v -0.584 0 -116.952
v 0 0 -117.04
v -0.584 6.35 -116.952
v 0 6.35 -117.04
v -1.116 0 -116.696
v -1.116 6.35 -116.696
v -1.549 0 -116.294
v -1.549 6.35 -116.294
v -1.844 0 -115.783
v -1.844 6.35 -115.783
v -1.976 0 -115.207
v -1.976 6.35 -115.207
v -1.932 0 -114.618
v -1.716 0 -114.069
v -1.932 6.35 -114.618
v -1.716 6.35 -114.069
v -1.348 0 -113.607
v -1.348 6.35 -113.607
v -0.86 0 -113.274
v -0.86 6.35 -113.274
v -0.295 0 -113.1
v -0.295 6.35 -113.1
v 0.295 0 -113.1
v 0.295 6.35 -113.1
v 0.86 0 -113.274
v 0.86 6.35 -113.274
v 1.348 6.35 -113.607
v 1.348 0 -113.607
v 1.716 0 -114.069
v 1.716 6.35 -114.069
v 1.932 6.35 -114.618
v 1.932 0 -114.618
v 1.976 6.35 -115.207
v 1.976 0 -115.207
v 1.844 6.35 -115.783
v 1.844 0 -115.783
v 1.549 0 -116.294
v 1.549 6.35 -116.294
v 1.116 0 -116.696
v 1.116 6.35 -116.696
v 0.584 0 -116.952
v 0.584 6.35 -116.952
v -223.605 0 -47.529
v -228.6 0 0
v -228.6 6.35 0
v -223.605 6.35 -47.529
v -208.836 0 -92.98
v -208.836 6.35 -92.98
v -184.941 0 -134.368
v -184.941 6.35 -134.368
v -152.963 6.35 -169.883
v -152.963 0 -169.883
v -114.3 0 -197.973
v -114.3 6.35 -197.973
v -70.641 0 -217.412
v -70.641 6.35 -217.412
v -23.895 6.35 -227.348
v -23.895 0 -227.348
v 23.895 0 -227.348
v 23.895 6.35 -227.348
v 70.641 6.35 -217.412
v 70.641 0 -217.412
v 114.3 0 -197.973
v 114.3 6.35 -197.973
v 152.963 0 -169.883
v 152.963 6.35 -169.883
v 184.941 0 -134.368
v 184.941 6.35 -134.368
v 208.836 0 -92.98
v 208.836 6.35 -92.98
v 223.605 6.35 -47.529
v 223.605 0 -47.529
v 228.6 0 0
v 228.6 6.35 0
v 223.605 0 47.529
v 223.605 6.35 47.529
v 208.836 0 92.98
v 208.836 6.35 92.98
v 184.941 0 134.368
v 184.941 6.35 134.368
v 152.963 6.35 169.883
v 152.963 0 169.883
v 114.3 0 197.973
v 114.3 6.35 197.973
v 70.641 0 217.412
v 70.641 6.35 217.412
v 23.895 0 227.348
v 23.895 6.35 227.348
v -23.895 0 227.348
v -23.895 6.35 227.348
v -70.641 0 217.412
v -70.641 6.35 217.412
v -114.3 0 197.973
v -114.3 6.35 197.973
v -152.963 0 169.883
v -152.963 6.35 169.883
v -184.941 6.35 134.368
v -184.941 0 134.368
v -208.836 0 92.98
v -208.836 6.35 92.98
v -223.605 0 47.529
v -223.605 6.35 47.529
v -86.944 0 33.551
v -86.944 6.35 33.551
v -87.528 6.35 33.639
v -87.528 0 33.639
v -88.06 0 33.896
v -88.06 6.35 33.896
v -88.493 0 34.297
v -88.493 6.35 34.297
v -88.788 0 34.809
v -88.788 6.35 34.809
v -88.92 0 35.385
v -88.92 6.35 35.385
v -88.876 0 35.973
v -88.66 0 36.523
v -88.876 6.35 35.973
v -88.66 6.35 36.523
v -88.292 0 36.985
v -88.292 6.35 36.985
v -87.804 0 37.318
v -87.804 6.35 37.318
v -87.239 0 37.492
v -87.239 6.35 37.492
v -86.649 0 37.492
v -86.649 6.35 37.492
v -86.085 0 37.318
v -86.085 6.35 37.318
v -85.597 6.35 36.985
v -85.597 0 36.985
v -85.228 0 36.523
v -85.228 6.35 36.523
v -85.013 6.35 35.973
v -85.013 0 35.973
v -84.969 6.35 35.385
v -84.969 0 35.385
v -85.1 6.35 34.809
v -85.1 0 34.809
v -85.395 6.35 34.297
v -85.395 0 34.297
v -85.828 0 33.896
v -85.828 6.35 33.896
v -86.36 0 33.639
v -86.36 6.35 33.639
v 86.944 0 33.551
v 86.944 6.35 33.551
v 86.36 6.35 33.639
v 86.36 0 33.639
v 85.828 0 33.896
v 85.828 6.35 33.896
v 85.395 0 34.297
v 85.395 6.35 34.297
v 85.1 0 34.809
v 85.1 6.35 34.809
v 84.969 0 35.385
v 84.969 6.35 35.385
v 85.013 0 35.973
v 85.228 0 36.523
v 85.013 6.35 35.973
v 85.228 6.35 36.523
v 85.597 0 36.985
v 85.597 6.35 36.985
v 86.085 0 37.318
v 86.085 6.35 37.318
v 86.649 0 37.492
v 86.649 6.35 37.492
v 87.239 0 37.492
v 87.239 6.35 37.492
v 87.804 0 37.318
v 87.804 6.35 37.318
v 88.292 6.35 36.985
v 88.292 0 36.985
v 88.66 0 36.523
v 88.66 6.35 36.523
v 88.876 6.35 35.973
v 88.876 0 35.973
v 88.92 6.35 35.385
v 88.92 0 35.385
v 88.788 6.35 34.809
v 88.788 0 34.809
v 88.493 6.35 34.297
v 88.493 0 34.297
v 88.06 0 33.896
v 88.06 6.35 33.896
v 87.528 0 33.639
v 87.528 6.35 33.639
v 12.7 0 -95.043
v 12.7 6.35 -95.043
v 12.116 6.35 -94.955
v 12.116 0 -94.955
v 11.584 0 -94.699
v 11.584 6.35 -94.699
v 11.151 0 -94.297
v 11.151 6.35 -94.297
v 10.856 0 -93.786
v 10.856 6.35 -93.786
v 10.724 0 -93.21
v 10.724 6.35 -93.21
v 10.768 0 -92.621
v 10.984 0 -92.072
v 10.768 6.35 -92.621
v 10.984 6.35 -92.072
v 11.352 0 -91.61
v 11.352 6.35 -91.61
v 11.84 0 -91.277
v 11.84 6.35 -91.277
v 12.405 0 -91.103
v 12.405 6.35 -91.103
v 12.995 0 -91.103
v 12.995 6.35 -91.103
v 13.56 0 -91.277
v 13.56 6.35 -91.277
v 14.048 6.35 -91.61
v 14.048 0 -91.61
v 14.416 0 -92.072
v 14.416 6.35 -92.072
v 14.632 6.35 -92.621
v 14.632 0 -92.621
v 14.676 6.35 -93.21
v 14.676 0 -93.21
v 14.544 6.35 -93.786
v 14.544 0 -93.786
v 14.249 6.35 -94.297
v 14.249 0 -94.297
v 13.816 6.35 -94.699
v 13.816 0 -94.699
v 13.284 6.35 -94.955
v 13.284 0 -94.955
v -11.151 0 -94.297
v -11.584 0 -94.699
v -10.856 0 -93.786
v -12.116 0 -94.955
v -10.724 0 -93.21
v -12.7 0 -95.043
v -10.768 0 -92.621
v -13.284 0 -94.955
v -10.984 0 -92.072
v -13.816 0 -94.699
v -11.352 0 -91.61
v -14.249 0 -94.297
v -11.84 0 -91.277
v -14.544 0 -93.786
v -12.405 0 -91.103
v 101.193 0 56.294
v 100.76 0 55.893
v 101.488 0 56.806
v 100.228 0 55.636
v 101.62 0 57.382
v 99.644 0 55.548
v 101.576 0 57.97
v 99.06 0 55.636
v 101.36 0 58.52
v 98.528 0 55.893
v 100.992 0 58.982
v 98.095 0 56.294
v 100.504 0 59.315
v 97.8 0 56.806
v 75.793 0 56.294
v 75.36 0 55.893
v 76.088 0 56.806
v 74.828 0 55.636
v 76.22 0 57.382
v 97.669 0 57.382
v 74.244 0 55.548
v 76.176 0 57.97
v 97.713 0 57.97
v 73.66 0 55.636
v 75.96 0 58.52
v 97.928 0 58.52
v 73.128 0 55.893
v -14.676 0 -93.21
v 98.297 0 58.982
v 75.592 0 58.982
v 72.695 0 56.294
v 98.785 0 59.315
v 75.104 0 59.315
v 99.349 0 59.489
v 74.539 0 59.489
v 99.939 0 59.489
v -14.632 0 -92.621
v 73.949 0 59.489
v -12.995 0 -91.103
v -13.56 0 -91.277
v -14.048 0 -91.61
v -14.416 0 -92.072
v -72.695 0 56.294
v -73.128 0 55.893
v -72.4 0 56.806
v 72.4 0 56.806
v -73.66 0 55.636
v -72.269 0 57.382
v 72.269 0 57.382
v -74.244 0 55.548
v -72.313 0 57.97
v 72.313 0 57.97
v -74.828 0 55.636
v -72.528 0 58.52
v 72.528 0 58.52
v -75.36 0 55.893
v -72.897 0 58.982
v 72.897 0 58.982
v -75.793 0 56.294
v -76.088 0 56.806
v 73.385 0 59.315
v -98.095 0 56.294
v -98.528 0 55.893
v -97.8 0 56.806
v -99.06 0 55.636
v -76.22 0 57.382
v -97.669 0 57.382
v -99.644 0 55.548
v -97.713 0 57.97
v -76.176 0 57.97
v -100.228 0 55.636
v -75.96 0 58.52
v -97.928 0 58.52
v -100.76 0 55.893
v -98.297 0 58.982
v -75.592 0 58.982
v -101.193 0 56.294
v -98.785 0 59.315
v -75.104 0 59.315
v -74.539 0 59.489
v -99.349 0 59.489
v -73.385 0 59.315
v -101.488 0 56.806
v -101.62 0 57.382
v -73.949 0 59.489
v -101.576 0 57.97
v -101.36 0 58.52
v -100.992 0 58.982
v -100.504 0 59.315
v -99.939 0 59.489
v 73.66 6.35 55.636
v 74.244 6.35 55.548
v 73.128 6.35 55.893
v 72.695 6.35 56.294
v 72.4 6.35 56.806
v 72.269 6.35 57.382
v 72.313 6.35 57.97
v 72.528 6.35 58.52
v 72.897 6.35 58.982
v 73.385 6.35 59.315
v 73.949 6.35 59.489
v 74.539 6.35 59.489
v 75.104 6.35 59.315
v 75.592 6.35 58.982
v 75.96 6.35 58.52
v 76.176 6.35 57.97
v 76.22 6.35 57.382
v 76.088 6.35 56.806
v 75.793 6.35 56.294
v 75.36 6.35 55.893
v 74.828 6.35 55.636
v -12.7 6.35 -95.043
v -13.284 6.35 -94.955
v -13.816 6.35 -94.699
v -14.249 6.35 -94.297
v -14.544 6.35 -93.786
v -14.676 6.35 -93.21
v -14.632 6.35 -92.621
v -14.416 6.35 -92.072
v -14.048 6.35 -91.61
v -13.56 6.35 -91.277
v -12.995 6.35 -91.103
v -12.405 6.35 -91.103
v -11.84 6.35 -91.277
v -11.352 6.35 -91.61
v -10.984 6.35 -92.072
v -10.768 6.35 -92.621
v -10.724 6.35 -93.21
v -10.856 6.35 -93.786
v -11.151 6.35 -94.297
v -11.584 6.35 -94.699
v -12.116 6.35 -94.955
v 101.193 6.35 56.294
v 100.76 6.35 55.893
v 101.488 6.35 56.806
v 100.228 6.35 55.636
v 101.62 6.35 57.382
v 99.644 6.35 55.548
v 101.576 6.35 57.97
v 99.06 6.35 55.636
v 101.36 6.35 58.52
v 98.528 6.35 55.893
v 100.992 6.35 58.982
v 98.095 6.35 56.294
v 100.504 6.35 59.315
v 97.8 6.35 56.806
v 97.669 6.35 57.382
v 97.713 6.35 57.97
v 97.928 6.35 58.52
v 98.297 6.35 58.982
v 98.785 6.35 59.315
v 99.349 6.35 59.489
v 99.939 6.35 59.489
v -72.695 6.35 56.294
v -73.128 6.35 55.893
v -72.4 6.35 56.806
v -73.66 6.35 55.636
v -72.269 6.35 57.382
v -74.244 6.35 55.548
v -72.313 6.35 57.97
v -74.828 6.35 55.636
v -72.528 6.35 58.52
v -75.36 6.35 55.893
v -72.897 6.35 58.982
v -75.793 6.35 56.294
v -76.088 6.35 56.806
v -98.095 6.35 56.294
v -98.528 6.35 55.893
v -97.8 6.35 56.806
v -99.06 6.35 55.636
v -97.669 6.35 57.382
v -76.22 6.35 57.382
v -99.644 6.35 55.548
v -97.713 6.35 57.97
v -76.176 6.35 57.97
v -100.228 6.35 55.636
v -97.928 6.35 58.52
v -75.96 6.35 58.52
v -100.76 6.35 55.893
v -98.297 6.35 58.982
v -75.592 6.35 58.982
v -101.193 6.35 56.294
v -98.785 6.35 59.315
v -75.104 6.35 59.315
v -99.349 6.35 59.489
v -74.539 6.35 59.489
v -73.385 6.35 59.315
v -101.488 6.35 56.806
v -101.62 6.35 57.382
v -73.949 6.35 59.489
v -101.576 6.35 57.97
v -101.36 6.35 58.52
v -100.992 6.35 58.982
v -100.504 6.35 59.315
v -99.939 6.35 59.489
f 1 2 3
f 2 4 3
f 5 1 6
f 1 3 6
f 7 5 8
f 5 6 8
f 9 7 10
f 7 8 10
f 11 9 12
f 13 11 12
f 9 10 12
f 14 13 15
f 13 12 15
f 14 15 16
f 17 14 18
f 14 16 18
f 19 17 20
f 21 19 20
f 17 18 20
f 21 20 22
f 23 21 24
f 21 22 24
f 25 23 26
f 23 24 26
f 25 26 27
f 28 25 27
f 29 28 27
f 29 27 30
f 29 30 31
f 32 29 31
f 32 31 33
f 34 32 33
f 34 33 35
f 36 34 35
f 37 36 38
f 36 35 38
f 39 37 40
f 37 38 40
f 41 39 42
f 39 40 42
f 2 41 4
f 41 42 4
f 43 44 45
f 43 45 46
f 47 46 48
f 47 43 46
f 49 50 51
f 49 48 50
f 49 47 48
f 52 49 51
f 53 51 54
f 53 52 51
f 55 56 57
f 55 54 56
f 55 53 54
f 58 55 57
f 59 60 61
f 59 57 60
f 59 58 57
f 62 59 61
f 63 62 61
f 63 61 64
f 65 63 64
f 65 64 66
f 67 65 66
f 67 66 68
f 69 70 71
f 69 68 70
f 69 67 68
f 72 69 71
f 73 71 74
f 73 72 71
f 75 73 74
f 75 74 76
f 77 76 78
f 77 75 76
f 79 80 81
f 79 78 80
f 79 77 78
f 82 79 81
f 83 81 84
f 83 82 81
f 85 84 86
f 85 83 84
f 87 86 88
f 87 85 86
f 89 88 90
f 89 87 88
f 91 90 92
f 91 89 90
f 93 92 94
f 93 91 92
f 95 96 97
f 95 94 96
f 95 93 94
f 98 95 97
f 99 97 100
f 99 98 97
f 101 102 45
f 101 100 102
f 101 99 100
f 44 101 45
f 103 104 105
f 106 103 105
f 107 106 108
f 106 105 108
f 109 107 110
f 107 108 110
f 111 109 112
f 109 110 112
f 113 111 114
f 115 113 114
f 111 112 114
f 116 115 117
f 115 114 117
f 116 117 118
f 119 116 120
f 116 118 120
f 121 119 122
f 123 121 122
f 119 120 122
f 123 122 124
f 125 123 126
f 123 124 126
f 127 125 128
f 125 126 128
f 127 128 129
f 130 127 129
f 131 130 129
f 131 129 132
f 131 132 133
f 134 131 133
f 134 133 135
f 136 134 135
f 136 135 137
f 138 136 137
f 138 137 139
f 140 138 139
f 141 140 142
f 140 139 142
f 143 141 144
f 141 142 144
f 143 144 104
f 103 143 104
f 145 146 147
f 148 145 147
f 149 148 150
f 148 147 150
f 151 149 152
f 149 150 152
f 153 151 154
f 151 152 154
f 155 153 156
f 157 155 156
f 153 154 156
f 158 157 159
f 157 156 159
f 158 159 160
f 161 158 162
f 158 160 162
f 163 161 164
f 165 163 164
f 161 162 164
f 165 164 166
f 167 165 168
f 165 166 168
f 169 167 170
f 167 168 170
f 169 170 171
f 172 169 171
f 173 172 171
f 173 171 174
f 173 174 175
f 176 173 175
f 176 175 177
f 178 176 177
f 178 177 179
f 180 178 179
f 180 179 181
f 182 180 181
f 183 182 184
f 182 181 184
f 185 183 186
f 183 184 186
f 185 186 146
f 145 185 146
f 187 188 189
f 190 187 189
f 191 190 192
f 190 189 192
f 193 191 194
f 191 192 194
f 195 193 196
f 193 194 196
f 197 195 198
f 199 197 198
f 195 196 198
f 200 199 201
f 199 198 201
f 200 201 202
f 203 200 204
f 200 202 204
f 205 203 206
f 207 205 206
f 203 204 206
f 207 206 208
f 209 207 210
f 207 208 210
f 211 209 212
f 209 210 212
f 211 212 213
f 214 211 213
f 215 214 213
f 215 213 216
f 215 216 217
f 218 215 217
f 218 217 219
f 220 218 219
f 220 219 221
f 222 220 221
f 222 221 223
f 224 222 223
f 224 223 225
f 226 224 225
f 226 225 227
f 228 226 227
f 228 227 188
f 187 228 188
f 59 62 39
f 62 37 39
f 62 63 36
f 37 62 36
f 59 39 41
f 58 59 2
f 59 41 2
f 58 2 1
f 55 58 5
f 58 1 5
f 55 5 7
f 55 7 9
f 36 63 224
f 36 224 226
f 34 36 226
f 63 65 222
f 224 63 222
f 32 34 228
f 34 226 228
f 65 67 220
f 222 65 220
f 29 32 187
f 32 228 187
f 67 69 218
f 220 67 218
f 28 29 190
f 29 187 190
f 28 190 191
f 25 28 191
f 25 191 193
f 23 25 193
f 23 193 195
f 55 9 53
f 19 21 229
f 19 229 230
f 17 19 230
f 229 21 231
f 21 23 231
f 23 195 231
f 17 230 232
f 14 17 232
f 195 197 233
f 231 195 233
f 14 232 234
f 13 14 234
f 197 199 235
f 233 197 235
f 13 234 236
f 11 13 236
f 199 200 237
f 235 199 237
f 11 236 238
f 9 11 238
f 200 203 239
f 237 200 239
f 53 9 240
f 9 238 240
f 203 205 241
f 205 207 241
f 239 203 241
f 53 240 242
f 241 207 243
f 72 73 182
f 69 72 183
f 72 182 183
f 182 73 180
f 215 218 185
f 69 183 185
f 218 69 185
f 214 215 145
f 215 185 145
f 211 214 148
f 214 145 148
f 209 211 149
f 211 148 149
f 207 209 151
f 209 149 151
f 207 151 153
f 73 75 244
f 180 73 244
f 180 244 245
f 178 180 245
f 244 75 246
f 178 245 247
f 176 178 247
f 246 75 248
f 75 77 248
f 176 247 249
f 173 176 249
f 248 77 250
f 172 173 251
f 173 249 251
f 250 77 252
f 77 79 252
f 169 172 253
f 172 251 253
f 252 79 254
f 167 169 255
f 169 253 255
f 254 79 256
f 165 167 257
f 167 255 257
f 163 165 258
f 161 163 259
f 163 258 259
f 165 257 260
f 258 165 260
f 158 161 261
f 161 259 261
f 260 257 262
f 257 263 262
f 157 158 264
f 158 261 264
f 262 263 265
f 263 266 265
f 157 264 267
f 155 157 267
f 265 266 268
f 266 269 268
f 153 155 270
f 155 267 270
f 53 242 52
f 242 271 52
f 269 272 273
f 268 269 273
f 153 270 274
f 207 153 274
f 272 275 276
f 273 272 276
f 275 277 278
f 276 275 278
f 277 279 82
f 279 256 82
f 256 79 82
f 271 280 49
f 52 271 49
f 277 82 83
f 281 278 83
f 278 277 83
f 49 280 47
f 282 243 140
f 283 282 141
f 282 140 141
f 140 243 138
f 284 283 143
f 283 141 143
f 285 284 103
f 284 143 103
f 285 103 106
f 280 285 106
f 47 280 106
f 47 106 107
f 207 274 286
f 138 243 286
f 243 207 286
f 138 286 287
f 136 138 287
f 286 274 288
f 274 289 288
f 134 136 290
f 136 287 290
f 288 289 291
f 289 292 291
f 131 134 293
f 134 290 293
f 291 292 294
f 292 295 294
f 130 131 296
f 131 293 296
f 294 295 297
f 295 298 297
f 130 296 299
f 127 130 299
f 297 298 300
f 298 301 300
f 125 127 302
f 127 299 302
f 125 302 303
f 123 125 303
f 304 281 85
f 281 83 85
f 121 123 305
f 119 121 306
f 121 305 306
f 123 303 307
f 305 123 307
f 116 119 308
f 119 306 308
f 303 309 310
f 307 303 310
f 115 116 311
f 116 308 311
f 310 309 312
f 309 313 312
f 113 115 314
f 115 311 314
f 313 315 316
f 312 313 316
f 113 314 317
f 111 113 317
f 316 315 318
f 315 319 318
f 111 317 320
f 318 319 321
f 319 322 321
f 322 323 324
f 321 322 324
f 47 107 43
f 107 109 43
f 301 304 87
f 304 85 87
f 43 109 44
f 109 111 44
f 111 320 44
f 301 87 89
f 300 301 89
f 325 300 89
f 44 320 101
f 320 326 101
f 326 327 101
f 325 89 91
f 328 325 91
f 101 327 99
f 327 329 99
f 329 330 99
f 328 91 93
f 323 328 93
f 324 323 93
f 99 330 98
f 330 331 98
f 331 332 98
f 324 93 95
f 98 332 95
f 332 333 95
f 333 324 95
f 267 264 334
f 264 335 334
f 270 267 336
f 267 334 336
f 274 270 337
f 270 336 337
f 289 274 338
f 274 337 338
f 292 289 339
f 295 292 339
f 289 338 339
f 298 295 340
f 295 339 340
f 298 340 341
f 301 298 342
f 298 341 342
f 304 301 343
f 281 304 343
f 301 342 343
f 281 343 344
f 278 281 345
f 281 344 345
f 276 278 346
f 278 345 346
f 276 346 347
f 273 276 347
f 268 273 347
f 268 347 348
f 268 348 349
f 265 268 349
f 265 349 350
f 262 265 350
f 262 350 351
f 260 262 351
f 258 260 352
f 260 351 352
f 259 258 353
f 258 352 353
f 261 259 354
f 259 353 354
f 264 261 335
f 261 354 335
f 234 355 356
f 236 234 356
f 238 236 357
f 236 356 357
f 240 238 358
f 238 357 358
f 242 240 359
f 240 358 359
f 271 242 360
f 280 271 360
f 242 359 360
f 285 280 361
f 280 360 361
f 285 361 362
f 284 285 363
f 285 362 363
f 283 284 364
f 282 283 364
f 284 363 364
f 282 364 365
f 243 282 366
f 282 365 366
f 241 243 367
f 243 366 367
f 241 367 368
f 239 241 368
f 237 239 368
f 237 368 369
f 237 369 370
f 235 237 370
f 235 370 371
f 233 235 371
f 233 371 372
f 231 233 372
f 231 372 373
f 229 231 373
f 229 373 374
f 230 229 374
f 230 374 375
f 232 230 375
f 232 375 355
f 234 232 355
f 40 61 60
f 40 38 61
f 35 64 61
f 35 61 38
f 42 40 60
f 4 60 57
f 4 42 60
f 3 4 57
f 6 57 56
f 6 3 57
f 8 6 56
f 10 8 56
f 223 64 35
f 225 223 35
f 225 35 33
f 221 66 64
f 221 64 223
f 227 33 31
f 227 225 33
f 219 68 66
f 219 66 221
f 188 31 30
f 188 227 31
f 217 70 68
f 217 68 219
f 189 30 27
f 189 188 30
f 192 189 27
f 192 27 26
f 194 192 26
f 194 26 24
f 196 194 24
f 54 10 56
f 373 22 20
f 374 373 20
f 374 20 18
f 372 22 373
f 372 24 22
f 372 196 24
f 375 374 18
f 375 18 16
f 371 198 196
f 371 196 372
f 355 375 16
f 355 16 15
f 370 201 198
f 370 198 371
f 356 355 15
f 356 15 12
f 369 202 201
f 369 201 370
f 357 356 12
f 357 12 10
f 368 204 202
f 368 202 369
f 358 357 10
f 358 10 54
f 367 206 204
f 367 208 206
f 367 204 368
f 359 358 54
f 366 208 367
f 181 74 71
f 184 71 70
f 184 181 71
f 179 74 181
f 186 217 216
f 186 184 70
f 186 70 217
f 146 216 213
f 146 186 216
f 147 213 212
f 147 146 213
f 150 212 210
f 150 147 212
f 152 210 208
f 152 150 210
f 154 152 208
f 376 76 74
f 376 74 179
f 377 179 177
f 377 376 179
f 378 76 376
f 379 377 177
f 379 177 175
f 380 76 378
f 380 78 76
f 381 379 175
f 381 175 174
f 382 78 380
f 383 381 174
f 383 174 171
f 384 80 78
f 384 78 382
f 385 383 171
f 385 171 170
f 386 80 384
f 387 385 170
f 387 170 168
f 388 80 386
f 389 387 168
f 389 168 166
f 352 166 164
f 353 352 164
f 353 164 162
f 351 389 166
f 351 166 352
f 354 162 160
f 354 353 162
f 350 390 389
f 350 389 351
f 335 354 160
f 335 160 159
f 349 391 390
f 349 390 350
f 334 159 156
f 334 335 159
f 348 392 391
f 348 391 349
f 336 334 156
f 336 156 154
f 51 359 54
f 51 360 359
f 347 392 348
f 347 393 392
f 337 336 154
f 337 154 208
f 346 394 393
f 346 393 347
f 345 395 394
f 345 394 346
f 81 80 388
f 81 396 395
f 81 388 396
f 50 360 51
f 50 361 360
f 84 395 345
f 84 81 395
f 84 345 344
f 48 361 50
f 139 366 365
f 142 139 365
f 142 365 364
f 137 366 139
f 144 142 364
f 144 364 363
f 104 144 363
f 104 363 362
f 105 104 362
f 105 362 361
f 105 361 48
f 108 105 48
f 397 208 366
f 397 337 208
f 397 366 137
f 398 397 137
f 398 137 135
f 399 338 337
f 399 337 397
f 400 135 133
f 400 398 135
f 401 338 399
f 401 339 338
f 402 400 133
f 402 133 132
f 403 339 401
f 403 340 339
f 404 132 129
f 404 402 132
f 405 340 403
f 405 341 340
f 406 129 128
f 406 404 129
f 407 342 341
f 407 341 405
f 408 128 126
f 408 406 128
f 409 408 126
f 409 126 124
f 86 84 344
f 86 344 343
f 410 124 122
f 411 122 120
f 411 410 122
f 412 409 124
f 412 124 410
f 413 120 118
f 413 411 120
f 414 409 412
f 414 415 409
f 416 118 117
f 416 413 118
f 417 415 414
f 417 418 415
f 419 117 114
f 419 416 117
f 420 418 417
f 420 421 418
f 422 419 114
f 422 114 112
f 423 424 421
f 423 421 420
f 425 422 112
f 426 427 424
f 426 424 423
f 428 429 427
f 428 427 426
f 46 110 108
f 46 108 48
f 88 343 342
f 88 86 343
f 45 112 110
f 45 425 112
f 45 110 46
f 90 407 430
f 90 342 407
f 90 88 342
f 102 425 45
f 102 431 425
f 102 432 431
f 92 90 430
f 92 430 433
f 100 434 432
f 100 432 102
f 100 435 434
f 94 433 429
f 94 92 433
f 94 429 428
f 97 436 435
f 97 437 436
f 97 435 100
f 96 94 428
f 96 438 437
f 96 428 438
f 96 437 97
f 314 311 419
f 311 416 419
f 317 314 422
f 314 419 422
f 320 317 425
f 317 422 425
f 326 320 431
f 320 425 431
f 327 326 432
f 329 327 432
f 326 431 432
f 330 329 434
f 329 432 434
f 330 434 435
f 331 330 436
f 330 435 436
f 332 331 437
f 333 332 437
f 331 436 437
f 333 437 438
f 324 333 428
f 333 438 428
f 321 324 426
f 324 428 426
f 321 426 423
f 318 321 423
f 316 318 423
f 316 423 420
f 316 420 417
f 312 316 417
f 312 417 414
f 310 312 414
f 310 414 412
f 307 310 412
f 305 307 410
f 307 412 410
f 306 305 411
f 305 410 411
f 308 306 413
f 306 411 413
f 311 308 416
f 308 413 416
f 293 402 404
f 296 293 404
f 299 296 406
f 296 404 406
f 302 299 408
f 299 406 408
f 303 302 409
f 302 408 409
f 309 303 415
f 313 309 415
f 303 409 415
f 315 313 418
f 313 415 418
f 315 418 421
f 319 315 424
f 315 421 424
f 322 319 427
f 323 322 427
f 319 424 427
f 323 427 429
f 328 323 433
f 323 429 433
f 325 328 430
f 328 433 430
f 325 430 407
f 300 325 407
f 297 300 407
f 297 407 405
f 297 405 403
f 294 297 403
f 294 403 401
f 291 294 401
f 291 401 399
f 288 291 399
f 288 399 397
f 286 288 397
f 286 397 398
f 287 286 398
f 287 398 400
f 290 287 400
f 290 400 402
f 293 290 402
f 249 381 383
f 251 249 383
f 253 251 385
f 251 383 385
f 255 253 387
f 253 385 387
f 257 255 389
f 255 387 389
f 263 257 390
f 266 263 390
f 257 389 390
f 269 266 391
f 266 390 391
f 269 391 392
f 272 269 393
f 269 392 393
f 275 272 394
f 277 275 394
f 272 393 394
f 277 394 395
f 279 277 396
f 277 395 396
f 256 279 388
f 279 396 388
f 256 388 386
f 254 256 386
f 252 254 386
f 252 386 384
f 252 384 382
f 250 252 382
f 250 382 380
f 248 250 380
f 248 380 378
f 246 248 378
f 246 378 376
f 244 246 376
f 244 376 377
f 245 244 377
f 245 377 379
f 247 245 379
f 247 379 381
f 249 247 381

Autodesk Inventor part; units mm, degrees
ref_plane "YZ Plane" through (0, 0, 0) normal (1, 0, 0) x (0, 1, 0)
ref_plane "XZ Plane" through (0, 0, 0) normal (0, 1, 0) x (-1, 0, 0)
ref_plane "XY Plane" through (0, 0, 0) normal (0, 0, 1) x (1, 0, 0)
sketch "Sketch1" plane through (0, 0, 0) normal (0, 1, 0) x (-1, 0, 0)
  circle A0 centre (0, 0) radius 228.6
  line L0 (228.6, 0) -> (-228.6, 0) construction
  line L1 (0, -115.0592) -> (-99.6442, 57.5296) construction
  line L2 (-99.6442, 57.5296) -> (99.6442, 57.5296) construction
  line L3 (99.6442, 57.5296) -> (0, -115.0592) construction
  line L4 (99.6442, 57.5296) -> (74.2442, 57.5296) construction
  line L5 (99.6442, 57.5296) -> (86.9442, 35.5326) construction
  line L6 (-99.6442, 57.5296) -> (-74.2442, 57.5296) construction
  line L7 (-99.6442, 57.5296) -> (-86.9442, 35.5326) construction
  line L8 (0, -115.0592) -> (12.7, -93.0622) construction
  line L9 (0, -115.0592) -> (-12.7, -93.0622) construction
  dimension "d26" = 457.2
  dimension "d27" = 199.2884
  dimension "d28" = 25.4
  dimension "d29" = 25.4
  dimension "d30" = 25.4
  dimension "d31" = 25.4
  dimension "d32" = 25.4
  dimension "d33" = 25.4
extrude "Extrusion1" add sketch "Sketch1" along normal blind 6.35
hole "Hole1" at (-99.6442, 0, 57.5296) at (-74.2442, 0, 57.5296) at (-86.9442, 0, 35.5326) at (-12.7, 0, -93.0622) at (0, 0, -115.0592) at (12.7, 0, -93.0622) at (99.6442, 0, 57.5296) at (74.2442, 0, 57.5296) at (86.9442, 0, 35.5326) direction (0, 1, 0) diameter 3.9624 end through all thread size "10-32 UNF" class "2B" standard "ANSI Unified Screw Threads"
properties part number "Table"
